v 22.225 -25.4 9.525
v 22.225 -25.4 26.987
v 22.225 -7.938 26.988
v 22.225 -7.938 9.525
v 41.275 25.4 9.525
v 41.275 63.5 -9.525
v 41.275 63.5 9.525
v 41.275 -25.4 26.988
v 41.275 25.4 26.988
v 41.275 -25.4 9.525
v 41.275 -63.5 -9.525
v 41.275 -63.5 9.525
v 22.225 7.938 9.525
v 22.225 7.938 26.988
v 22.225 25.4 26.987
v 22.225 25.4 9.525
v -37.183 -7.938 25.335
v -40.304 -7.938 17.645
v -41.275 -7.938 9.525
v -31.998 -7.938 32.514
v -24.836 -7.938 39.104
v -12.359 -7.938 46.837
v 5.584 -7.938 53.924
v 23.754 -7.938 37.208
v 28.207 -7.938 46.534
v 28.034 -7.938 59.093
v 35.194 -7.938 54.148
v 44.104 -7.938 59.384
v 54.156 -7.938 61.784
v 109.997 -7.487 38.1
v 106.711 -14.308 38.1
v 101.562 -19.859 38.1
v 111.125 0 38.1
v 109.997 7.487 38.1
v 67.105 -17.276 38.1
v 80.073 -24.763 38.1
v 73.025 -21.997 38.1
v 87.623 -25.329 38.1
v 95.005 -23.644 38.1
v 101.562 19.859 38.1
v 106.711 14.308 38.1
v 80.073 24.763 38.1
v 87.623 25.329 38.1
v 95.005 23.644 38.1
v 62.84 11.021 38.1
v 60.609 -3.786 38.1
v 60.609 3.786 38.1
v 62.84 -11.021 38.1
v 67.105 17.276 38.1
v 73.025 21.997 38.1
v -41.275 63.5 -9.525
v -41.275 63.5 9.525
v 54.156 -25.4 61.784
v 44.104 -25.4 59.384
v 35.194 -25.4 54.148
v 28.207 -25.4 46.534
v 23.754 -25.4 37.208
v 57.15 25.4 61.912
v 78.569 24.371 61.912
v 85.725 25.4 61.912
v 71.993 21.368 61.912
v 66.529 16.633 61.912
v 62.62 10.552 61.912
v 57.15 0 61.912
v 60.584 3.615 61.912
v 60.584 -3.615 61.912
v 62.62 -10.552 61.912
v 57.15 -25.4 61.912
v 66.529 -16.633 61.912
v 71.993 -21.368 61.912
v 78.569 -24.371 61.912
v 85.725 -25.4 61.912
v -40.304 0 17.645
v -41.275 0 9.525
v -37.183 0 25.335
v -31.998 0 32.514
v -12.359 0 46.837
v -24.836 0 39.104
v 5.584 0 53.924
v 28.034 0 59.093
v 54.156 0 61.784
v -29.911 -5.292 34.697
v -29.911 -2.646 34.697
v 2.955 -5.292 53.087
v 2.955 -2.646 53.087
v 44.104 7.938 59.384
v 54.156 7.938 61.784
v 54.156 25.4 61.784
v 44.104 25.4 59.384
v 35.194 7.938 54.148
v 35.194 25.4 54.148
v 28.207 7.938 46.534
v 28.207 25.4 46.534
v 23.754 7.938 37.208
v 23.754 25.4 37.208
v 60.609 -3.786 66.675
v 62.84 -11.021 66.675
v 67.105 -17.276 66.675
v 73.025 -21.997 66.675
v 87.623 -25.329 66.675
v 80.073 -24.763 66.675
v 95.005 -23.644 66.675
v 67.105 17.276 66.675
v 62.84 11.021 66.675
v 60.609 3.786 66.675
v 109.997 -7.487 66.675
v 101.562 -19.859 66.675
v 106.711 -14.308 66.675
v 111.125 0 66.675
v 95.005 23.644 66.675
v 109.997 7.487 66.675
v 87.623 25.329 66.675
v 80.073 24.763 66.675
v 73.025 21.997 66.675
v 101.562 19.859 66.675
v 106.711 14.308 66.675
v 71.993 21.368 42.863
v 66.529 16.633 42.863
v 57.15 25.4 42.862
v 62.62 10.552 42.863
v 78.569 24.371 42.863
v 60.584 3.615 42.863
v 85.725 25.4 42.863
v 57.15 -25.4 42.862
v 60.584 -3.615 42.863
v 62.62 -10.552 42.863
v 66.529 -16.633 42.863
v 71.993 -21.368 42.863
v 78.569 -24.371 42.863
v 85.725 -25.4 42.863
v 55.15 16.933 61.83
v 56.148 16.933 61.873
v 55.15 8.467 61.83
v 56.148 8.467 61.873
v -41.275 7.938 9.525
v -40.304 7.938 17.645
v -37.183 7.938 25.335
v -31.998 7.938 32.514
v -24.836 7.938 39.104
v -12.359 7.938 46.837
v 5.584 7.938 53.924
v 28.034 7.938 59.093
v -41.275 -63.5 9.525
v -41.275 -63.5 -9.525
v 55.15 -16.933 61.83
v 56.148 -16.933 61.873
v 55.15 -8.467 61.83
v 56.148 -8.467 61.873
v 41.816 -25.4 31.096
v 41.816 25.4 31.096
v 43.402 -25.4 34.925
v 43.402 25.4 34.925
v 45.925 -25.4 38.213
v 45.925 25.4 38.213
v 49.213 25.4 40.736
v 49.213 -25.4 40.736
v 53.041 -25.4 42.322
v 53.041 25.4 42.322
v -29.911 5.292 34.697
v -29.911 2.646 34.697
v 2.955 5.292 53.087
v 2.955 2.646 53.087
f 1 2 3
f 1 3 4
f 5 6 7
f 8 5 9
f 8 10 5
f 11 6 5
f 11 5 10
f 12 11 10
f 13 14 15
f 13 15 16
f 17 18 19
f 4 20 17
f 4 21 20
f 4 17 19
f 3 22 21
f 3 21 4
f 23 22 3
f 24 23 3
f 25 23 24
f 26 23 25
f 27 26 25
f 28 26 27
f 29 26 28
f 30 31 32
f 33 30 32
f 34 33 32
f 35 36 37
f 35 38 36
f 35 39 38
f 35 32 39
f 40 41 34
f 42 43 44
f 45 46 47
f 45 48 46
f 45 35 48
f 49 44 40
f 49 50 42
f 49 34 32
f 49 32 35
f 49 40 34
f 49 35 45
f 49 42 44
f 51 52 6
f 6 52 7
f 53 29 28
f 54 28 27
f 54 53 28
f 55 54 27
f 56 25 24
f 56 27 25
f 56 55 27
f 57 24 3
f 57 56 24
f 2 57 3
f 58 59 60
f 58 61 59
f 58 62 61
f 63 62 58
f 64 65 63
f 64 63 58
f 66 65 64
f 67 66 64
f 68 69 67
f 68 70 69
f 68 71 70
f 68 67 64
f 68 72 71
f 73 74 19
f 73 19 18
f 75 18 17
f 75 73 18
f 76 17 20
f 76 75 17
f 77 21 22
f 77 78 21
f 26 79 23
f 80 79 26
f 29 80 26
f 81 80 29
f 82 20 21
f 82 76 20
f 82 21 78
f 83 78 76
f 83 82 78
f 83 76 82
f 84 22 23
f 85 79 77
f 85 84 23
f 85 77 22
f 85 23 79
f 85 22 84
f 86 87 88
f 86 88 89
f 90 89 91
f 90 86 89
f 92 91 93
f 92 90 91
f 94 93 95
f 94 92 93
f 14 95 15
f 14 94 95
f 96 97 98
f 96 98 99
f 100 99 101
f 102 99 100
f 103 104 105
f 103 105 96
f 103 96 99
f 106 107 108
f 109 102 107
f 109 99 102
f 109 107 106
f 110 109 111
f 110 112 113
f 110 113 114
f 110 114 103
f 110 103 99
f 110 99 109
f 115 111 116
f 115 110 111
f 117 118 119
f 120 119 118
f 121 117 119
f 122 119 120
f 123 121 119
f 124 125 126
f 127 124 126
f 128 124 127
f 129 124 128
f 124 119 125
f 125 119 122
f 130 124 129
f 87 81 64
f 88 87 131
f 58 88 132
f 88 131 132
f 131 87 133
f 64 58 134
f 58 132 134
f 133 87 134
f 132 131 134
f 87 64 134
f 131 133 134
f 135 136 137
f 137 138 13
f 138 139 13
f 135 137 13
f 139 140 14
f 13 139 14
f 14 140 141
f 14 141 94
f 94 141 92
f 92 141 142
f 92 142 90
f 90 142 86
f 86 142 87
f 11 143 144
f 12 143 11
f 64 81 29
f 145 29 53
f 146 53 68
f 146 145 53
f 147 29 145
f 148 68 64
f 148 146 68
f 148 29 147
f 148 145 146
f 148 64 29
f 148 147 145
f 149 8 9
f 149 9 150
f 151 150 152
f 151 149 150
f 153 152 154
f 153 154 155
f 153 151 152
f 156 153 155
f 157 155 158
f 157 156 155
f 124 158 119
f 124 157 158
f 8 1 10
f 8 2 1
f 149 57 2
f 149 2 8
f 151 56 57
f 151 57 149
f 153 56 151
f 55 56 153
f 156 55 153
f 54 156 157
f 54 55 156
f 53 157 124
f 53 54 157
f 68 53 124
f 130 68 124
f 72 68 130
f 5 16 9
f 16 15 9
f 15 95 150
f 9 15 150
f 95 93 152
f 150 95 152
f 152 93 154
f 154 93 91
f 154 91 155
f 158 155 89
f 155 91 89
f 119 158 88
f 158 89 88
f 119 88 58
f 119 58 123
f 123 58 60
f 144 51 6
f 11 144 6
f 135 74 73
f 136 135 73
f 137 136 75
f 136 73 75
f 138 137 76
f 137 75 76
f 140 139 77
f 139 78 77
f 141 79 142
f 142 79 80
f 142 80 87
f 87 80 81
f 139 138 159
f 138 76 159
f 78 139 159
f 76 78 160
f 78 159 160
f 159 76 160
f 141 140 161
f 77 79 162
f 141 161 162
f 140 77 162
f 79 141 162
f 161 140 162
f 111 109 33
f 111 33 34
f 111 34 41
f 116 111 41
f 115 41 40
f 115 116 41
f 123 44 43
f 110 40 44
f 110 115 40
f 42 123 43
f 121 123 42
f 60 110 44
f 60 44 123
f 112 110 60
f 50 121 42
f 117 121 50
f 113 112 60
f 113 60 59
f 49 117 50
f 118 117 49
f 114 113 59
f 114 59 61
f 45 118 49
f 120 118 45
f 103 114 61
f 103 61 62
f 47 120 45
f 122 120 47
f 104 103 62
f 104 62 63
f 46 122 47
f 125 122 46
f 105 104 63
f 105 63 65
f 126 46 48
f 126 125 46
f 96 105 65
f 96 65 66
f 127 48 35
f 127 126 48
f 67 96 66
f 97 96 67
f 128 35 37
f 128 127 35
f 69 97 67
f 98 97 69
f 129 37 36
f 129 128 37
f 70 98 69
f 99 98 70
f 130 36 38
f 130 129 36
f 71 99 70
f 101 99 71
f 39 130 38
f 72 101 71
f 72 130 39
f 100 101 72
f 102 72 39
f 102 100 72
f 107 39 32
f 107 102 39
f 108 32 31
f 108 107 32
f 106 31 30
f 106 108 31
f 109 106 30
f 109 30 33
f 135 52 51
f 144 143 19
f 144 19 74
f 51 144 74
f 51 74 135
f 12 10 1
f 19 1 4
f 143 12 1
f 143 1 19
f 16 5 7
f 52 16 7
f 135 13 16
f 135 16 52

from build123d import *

# Parameters (mm, degrees)
F1_DEPTH = 63.5
F0_W     = 25.4
F0_H     = 19.05
F2_DEPTH = 25.4
F3_DEPTH = 7.9375


with BuildPart() as f1:
    # F0 (on Front) → F1 (new body, symmetric)
    with BuildSketch(Plane.XZ):
        Polygon((41.275, -9.525), (41.275, 9.525), (22.225, 9.525), (-41.275, 9.525), (-41.275, -9.525), align=None)
    extrude(amount=F1_DEPTH, both=True)

    # F0 (on Front) → F2 (join, symmetric)
    with BuildSketch(Plane.XZ):
        with BuildLine():
            Line((22.225, 9.525), (41.275, 9.525))
            Line((41.275, 9.525), (41.275, 26.9875))
            ThreePointArc((41.275, 26.9875), (45.9246798487, 38.2128201513), (57.15, 42.8625))
            Line((57.15, 42.8625), (60.325, 42.8625))
            Line((60.325, 42.8625), (60.325, 61.9125))
            Line((60.325, 61.9125), (57.15, 61.9125))
            add(Edge.make_bspline(
                [(54.1562335502, 61.783950788), (55.1478189239, 61.8321045059), (56.1457632688, 61.8749746399), (57.15, 61.9125)],
                knots=[109.6652027071, 109.6652027071, 109.6652027071, 109.6652027071, 111.4985685166, 111.4985685166, 111.4985685166, 111.4985685166], degree=3))
            ThreePointArc((54.1562335502, 61.783950788), (31.4175990407, 50.6010377669), (22.225, 26.9875))
            Line((22.225, 26.9875), (22.225, 9.525))
        make_face()
        with Locations((73.025, 52.3875)):
            Rectangle(F0_W, F0_H)
    extrude(amount=F2_DEPTH, both=True)

    # F0 (on Front) → F3 (join, symmetric)
    with BuildSketch(Plane.XZ):
        with BuildLine():
            Line((-41.275, 9.525), (22.225, 9.525))
            Line((22.225, 9.525), (22.225, 26.9875))
            ThreePointArc((22.225, 26.9875), (31.4175990407, 50.6010377669), (54.1562335502, 61.783950788))
            add(Edge.make_bspline(
                [(-41.275, 9.525), (-41.7173976774, 37.118570419), (-5.1567581261, 58.9035724155), (54.1562335502, 61.783950788)],
                knots=[0, 0, 0, 0, 109.6652027071, 109.6652027071, 109.6652027071, 109.6652027071], degree=3))
        make_face()
    extrude(amount=F3_DEPTH, both=True)

    # F0 (on Front) → F4 (revolve)
    with BuildSketch(Plane.XZ):
        Polygon((85.725, 61.9125), (85.725, 42.8625), (85.725, 38.1), (111.125, 38.1), (111.125, 66.675), (85.725, 66.675), align=None)
    revolve(axis=Axis((85.725, 0, 52.3875), (0, 0, 1)))


solid = f1.part
